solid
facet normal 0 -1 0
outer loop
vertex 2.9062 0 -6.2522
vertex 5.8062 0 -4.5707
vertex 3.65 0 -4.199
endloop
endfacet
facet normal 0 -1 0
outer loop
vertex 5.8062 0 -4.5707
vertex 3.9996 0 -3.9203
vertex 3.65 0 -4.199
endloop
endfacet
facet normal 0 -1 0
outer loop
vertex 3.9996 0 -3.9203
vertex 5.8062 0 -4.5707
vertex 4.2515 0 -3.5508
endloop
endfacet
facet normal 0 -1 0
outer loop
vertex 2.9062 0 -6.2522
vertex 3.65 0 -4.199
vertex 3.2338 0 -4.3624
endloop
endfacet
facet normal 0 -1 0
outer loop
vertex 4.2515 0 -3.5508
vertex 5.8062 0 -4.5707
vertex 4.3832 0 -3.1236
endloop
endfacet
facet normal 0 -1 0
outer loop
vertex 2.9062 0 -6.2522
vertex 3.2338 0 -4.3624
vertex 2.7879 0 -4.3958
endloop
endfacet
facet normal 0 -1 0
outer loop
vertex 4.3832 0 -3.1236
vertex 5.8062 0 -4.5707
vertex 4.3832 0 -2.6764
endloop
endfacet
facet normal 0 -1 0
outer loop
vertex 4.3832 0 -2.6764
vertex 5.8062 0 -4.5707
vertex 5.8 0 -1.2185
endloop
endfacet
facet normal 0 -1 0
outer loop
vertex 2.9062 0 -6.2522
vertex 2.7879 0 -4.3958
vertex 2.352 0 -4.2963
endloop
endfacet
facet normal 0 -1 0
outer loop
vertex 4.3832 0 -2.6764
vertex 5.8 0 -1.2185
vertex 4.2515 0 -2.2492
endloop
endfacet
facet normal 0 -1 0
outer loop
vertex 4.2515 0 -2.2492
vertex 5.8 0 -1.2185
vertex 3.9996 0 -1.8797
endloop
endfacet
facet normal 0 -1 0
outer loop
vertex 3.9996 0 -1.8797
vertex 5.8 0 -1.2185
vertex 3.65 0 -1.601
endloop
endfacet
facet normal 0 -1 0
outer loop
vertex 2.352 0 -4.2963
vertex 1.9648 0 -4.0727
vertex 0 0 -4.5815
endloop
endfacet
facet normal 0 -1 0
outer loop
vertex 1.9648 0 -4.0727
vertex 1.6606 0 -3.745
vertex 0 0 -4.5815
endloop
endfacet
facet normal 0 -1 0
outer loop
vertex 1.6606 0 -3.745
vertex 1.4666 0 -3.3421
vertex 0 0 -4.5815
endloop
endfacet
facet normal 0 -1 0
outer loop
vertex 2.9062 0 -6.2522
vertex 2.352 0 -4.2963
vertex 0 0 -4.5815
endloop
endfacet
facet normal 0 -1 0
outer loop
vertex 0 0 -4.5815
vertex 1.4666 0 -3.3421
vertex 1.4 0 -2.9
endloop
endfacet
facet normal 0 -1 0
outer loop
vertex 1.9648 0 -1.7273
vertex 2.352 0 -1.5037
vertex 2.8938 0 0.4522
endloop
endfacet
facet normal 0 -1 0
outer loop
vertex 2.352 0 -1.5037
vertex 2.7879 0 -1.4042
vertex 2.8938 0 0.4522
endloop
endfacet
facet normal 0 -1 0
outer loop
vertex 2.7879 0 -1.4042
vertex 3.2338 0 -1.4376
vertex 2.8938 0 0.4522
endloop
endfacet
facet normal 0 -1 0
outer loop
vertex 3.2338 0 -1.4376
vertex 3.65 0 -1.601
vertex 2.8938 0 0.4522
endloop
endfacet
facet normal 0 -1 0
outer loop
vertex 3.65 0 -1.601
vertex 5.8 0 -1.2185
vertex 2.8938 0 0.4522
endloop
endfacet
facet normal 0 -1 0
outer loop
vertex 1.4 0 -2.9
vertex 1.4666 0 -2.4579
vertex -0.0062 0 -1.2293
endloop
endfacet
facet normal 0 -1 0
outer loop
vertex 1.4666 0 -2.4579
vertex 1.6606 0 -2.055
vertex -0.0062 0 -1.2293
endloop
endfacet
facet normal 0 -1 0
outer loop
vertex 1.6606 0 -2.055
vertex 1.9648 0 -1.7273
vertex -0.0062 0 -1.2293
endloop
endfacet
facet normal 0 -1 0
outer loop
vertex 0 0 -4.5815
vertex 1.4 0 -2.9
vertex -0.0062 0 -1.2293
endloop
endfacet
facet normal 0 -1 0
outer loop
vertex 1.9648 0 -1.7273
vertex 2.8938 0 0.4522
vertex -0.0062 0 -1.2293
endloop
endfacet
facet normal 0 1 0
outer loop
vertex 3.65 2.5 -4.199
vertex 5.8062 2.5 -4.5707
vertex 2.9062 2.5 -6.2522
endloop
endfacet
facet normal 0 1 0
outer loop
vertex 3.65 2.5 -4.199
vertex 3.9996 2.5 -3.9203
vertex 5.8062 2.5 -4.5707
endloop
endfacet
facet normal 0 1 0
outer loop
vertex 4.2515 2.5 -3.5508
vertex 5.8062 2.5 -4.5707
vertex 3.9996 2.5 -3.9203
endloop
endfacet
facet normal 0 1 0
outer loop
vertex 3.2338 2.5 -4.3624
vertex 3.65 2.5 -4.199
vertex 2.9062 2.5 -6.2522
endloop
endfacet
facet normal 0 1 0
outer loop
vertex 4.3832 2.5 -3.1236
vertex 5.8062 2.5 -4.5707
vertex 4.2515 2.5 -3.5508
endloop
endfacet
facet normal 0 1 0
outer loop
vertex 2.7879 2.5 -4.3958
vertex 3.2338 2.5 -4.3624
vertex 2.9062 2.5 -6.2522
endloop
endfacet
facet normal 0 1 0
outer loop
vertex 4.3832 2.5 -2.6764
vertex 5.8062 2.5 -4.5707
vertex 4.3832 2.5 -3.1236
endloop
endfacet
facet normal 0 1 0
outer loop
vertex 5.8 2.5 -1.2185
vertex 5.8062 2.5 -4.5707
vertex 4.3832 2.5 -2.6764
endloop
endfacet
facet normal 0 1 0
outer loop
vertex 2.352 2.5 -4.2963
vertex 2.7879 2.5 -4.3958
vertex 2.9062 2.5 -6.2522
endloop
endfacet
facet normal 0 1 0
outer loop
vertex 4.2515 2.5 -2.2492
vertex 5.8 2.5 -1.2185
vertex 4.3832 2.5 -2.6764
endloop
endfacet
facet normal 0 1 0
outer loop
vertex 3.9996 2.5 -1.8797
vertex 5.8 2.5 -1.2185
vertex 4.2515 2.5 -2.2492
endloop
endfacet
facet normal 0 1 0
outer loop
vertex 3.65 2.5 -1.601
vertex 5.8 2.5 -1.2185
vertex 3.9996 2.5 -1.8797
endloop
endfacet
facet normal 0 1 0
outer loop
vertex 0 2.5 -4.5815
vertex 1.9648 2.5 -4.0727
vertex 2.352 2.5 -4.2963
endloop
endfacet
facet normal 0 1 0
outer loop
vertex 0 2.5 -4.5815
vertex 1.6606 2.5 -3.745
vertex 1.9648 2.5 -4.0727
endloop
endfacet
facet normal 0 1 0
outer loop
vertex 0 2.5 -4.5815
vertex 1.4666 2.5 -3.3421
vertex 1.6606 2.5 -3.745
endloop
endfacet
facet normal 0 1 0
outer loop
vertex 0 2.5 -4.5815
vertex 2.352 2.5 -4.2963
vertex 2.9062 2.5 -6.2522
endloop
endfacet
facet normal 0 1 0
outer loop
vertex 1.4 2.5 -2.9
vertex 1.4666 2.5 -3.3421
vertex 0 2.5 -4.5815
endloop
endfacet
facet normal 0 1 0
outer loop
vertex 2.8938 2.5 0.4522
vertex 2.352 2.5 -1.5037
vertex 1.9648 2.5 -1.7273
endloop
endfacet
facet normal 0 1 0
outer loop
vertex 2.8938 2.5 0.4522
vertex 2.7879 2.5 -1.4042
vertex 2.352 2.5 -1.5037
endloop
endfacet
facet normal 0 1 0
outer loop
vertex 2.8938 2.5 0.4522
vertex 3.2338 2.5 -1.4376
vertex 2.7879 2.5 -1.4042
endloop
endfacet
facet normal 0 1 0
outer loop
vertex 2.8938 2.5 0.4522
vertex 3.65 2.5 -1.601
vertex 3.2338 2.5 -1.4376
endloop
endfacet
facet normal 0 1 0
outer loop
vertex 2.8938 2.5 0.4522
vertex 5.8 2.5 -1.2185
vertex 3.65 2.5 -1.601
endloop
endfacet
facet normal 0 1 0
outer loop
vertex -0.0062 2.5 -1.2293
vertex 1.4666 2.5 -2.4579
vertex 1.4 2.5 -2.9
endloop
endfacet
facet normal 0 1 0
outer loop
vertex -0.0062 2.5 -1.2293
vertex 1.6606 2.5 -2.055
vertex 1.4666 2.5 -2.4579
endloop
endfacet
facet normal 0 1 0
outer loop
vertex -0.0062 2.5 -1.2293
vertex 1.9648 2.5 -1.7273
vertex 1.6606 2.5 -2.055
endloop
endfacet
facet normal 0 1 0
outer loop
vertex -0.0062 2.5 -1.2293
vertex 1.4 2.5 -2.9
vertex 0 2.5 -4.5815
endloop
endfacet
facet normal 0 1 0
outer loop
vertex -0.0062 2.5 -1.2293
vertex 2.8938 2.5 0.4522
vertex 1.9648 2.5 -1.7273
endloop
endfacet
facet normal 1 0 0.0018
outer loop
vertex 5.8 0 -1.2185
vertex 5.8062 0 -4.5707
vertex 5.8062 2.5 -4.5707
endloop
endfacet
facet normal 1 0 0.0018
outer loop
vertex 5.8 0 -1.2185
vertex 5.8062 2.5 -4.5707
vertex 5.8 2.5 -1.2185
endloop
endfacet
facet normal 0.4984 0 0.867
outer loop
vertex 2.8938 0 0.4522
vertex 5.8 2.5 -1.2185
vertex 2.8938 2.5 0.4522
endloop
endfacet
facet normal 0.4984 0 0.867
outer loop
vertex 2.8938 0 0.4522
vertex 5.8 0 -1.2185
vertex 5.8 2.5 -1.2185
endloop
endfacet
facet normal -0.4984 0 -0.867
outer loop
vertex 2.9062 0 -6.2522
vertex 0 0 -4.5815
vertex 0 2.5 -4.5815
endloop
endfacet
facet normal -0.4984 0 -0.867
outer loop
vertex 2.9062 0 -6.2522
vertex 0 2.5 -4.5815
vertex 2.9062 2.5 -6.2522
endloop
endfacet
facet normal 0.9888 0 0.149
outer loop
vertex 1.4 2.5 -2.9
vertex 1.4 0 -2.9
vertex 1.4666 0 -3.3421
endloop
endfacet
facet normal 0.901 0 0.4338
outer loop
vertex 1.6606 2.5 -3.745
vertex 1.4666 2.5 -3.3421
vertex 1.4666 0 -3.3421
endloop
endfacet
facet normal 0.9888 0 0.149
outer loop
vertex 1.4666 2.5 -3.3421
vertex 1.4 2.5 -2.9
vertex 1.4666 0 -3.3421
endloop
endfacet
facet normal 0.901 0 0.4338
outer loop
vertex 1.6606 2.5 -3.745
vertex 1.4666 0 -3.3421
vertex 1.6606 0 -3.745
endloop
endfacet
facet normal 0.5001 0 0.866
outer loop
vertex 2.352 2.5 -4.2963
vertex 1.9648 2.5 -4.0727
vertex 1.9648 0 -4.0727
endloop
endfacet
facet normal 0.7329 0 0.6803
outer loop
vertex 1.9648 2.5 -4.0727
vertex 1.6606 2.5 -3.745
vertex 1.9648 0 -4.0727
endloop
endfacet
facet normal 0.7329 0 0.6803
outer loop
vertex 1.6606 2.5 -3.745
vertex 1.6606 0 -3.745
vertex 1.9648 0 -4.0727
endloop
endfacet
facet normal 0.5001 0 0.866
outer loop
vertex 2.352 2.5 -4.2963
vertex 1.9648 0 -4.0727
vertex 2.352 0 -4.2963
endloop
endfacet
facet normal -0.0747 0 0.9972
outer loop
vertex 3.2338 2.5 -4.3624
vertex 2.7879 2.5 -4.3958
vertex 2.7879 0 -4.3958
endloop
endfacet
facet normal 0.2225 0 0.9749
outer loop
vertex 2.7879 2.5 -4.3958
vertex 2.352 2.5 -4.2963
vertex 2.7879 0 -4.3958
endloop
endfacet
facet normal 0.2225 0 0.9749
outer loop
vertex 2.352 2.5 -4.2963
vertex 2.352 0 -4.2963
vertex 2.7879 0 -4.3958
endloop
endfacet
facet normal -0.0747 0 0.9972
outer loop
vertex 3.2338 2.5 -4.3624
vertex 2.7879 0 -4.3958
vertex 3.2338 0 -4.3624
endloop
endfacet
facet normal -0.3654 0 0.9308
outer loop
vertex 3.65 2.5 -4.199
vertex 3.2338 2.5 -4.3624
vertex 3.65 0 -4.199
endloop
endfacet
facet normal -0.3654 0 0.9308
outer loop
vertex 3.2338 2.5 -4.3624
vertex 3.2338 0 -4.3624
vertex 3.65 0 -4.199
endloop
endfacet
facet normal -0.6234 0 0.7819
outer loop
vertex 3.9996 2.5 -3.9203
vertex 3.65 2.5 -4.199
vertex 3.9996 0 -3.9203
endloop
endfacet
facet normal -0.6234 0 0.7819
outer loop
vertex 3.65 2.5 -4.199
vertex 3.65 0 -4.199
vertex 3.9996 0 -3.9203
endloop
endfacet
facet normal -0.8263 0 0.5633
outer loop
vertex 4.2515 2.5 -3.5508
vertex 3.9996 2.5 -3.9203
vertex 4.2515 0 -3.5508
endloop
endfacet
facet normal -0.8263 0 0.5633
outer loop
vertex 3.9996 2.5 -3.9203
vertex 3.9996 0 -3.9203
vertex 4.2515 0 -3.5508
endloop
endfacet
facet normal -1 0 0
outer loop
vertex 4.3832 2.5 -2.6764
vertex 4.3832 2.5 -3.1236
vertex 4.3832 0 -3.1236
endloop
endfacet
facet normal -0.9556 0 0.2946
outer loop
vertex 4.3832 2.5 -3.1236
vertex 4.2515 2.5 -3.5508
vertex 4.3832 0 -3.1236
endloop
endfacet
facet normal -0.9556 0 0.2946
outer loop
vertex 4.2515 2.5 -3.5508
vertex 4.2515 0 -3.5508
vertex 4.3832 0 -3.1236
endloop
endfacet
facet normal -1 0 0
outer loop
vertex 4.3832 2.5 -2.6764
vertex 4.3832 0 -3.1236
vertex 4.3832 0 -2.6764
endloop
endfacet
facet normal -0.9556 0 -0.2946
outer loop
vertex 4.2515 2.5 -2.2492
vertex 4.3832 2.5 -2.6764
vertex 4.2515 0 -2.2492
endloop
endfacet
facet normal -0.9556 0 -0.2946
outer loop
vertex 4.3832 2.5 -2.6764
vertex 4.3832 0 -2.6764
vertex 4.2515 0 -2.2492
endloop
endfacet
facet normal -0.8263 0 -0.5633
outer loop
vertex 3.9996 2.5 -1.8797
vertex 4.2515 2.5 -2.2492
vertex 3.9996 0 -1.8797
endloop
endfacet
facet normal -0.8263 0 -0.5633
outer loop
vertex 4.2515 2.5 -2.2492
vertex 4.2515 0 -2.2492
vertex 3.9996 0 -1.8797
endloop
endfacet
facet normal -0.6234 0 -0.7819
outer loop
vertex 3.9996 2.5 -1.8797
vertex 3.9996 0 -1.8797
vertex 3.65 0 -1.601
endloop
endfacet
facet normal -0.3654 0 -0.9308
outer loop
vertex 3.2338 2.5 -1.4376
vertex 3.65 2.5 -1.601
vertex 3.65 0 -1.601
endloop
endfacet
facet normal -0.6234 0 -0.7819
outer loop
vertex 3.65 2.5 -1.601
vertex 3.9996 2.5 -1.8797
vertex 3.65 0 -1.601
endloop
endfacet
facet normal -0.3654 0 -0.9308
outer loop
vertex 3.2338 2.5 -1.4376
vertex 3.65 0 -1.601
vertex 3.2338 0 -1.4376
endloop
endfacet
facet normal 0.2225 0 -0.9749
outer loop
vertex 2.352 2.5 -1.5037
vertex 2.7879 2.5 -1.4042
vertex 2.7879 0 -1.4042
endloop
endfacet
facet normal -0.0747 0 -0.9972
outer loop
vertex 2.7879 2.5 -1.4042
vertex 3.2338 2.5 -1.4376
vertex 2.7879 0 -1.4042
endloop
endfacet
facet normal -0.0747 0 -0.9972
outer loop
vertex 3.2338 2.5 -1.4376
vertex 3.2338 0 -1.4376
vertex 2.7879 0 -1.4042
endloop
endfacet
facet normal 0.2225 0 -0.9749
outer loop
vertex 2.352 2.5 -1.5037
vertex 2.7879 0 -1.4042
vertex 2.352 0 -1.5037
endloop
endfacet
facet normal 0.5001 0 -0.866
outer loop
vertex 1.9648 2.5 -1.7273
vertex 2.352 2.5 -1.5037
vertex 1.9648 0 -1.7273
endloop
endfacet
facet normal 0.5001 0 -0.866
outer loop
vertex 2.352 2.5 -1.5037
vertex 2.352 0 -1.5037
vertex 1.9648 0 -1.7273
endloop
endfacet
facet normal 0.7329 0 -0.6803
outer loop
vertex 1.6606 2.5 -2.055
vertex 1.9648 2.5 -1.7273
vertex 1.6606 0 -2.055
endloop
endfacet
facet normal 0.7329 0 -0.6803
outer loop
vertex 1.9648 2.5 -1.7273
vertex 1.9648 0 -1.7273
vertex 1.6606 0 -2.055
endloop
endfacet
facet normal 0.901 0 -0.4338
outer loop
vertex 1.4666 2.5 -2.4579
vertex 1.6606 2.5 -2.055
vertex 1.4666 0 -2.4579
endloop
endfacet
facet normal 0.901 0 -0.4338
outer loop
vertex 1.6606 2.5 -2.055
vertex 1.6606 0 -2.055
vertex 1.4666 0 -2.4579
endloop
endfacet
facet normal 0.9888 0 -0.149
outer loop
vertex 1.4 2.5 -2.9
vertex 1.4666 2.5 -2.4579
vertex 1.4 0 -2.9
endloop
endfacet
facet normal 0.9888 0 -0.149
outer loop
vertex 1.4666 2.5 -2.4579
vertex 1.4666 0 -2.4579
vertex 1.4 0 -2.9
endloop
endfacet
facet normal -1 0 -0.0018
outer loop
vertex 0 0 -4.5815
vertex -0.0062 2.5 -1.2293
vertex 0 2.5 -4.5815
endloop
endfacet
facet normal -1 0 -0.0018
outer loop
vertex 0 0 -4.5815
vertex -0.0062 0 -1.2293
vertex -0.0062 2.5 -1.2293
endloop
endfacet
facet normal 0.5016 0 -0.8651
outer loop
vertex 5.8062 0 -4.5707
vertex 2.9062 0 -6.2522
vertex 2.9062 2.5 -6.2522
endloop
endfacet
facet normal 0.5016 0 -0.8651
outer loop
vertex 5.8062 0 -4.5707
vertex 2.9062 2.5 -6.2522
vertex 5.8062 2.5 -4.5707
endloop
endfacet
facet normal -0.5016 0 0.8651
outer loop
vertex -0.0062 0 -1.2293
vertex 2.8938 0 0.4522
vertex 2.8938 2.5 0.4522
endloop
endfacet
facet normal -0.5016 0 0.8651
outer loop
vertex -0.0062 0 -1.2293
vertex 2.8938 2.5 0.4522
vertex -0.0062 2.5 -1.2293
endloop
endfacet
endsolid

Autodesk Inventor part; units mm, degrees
ref_plane "YZ Plane" through (0, 0, 0) normal (1, 0, 0) x (0, 1, 0)
ref_plane "XZ Plane" through (0, 0, 0) normal (0, 1, 0) x (-1, 0, 0)
ref_plane "XY Plane" through (0, 0, 0) normal (0, 0, 1) x (1, 0, 0)
sketch "Esboço1" plane through (0, 0, 0) normal (0, 1, 0) x (-1, 0, 0)
  line L0 (0, -4.5815) -> (-2.9062, -6.2522)
  line L1 (-2.9062, -6.2522) -> (-5.8062, -4.5707)
  line L2 (-5.8062, -4.5707) -> (-5.8, -1.2185)
  line L3 (-5.8, -1.2185) -> (-2.8938, 0.4522)
  line L4 (-2.8938, 0.4522) -> (0.0062, -1.2293)
  line L5 (0.0062, -1.2293) -> (0, -4.5815)
  circle A0 centre (-2.9, -2.9) radius 1.5
  point P0 (0, 0)
  dimension "d11" = 3
extrude "Extrusão1" add sketch "Esboço1" along normal blind 2.5
properties part number "Porca M3"
